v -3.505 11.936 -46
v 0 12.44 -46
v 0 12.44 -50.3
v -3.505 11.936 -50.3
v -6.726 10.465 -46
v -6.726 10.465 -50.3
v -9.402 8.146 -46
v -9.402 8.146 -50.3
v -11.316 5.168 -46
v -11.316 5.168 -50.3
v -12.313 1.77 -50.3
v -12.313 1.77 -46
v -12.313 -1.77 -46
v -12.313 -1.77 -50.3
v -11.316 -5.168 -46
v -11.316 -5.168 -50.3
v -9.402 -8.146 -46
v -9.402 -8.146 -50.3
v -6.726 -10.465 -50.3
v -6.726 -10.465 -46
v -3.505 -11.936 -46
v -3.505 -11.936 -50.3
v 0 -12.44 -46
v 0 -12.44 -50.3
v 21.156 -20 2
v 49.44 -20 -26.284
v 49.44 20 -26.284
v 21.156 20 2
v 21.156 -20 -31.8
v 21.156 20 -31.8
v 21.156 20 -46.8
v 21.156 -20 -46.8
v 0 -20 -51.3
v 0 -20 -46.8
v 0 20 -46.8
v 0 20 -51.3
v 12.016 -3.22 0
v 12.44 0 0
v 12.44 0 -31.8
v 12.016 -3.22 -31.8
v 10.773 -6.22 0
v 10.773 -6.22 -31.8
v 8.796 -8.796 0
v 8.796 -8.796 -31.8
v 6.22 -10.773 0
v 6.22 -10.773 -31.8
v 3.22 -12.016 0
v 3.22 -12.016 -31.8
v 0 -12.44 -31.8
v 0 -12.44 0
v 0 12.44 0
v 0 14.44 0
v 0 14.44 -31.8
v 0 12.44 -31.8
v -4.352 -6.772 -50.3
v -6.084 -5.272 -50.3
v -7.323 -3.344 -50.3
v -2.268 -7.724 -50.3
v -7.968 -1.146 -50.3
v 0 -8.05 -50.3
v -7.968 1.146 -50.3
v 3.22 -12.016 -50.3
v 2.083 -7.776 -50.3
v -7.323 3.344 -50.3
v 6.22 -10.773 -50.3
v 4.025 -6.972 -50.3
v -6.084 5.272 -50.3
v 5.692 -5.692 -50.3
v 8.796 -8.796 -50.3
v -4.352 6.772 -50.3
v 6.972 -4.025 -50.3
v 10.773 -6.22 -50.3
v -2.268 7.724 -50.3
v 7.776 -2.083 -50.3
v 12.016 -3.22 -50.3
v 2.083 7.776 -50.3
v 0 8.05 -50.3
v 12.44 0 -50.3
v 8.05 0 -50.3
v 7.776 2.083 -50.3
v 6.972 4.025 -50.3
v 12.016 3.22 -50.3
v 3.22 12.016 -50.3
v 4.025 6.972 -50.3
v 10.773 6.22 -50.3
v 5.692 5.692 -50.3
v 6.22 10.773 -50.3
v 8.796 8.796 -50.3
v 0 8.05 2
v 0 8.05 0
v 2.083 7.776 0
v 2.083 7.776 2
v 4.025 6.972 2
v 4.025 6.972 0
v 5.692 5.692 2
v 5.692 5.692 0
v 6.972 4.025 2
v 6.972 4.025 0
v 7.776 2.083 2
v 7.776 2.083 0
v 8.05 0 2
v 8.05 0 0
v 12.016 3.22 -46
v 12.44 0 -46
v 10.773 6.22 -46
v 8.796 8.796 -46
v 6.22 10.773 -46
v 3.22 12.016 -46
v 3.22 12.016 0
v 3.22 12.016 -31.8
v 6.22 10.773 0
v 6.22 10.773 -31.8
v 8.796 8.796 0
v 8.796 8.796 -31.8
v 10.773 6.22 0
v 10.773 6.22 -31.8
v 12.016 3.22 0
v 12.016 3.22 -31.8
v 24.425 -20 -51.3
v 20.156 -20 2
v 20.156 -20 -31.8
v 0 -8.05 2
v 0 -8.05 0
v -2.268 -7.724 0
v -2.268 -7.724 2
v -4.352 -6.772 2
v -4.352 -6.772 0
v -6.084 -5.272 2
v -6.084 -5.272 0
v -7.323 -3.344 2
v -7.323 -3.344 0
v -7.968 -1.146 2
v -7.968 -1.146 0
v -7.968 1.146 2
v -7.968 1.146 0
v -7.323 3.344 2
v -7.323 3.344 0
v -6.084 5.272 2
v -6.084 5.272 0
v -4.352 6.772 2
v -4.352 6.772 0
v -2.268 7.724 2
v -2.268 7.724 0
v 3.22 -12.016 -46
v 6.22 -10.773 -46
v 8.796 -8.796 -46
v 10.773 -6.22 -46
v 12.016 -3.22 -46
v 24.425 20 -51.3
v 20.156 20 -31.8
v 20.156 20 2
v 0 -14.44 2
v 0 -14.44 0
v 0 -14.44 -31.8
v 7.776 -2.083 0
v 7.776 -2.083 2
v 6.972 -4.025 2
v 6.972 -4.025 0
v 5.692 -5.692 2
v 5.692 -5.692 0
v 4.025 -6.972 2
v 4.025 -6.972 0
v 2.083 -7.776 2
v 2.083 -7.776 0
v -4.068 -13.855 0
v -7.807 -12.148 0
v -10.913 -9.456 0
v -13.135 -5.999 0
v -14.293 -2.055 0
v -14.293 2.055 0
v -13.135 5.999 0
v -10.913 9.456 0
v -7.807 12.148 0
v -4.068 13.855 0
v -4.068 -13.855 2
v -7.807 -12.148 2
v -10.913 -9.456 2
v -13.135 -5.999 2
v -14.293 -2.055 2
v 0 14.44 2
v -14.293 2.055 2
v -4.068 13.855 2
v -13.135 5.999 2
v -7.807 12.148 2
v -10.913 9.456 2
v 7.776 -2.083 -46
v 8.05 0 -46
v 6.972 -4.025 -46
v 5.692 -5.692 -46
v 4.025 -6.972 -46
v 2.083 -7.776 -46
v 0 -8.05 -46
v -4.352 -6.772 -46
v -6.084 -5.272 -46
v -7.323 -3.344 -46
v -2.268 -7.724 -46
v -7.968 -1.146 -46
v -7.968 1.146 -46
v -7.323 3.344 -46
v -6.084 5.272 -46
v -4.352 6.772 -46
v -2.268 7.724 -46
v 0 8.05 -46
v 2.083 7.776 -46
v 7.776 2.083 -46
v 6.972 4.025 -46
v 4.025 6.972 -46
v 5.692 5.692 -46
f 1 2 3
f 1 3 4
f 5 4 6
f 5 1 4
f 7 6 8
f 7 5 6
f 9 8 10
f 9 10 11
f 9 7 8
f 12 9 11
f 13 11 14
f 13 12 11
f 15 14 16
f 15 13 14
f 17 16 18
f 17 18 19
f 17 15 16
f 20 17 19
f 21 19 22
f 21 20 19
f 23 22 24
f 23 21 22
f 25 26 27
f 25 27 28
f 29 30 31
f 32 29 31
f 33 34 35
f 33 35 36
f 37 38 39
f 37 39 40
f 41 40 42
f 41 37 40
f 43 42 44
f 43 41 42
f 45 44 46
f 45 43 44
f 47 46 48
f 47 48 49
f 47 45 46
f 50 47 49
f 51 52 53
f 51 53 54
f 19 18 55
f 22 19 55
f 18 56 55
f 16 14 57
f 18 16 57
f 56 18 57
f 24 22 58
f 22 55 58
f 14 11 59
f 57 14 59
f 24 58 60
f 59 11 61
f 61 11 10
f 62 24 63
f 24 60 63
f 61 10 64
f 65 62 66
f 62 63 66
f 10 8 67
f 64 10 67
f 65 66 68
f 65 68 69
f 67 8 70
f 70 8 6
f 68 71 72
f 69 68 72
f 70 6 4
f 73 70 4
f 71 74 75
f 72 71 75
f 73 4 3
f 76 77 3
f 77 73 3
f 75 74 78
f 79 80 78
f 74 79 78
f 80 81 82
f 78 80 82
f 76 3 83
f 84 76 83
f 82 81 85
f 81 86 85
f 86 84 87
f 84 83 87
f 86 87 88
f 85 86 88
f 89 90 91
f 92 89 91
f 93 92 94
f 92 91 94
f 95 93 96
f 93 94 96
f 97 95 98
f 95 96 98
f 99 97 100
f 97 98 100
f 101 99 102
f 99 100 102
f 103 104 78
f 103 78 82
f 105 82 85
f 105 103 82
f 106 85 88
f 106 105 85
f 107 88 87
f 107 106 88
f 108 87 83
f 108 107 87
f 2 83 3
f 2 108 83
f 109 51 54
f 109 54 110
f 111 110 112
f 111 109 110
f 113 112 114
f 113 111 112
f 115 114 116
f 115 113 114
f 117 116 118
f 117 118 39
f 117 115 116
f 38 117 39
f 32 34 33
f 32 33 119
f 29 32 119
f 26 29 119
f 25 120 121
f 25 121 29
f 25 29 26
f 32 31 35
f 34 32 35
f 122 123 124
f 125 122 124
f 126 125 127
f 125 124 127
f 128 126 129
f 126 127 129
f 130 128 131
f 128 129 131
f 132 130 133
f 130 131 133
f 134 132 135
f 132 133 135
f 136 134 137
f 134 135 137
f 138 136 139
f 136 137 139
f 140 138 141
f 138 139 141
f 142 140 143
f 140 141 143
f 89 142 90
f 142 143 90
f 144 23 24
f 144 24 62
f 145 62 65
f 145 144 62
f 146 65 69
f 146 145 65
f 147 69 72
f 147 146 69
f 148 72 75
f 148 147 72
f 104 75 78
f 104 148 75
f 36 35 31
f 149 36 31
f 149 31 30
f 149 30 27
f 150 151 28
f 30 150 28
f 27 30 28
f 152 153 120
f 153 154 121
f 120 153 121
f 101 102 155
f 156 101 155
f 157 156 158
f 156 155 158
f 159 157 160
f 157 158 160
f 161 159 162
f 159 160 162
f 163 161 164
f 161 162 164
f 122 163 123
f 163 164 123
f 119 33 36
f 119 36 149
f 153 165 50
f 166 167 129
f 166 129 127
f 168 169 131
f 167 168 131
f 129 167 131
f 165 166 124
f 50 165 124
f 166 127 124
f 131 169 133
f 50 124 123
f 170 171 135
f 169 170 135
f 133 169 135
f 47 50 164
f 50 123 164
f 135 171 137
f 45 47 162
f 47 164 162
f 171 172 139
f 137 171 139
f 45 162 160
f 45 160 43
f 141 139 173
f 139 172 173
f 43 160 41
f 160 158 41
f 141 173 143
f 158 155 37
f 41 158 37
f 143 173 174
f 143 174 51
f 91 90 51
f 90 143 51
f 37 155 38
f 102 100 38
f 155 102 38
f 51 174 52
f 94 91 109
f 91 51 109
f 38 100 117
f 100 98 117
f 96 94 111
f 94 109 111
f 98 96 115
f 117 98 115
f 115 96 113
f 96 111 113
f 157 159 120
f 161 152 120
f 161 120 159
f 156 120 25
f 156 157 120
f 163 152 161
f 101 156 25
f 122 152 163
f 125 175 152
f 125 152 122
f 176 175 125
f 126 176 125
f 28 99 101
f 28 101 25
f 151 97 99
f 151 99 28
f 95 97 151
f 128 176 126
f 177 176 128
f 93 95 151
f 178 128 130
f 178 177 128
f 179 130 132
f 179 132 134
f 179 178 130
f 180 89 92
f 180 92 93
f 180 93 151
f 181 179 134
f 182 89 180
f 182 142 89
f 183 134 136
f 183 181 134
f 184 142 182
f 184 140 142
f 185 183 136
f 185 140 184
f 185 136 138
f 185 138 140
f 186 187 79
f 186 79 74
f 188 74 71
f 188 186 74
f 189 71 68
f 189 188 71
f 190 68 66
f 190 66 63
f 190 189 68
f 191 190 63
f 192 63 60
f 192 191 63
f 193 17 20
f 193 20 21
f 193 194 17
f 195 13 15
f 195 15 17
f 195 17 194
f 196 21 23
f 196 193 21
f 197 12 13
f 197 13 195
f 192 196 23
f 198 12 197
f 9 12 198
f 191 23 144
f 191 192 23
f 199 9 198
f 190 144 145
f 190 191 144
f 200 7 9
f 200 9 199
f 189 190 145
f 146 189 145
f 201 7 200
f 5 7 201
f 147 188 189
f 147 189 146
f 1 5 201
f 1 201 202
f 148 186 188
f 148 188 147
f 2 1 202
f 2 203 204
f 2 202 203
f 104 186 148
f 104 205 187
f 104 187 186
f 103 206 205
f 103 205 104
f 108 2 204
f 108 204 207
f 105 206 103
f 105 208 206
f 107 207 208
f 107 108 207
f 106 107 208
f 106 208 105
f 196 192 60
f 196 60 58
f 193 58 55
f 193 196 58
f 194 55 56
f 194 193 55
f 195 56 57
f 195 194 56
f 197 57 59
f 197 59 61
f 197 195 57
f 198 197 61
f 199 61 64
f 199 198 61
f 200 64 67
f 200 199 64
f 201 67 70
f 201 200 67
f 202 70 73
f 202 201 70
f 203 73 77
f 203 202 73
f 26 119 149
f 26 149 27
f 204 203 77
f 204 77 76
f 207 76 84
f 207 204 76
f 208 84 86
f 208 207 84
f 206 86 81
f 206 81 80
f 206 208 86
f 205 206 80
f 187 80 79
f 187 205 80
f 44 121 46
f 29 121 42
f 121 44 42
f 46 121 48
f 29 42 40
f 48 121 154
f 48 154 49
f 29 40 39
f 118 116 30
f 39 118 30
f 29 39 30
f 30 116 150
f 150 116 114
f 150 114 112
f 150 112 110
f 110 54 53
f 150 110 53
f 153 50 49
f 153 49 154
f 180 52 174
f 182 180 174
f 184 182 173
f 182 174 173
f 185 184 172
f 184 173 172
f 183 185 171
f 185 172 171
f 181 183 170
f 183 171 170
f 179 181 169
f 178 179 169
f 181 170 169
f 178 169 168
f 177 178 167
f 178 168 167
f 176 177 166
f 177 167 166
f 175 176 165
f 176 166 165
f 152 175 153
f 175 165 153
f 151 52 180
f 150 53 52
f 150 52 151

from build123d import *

# Parameters (mm, degrees)
F1_DEPTH = 31.8
F2_DEPTH = 31.8
F3_DEPTH = 2
F4_DEPTH = 1
F6_START = -46
F6_DEPTH = 4.3
F7_DEPTH = 40


with BuildPart() as f1:
    # F0 (on Top) → F1 (new body)
    with BuildSketch(Plane.XY):
        with BuildLine():
            ThreePointArc((0, 12.44), (8.796408358, 8.796408358), (12.44, 0))
            ThreePointArc((12.44, 0), (8.796408358, -8.796408358), (0, -12.44))
            Line((0, -12.44), (0, -14.44))
            ThreePointArc((0, -14.44), (10.2106219203, -10.2106219203), (14.44, 0))
            ThreePointArc((14.44, 0), (10.2106219203, 10.2106219203), (0, 14.44))
            Line((0, 14.44), (0, 12.44))
        make_face()
    extrude(amount=-F1_DEPTH)

    # F0 (on Top) → F2 (join)
    with BuildSketch(Plane.XY):
        with BuildLine():
            add(Edge.make_bspline(
                [(0, 14.44), (6.7187255869, 16.2933333333), (13.4374511739, 18.1466666667), (20.1561767608, 20)],
                knots=[0, 0, 0, 0, 20.9089708406, 20.9089708406, 20.9089708406, 20.9089708406], degree=3))
            ThreePointArc((0, 14.44), (10.2106219203, 10.2106219203), (14.44, 0))
            ThreePointArc((14.44, 0), (10.2106219203, -10.2106219203), (0, -14.44))
            add(Edge.make_bspline(
                [(0, -14.44), (6.7187255869, -16.2933333333), (13.4374511739, -18.1466666667), (20.1561767608, -20)],
                knots=[0, 0, 0, 0, 20.9089708406, 20.9089708406, 20.9089708406, 20.9089708406], degree=3))
            Line((20.1561767608, -20), (20.1561767608, 20))
        make_face()
    extrude(amount=-F2_DEPTH)

    # F0 (on Top) → F3 (join)
    with BuildSketch(Plane.XY):
        with BuildLine():
            ThreePointArc((0, 12.44), (8.796408358, 8.796408358), (12.44, 0))
            ThreePointArc((12.44, 0), (8.796408358, -8.796408358), (0, -12.44))
            Line((0, -12.44), (0, -14.44))
            ThreePointArc((0, -14.44), (10.2106219203, -10.2106219203), (14.44, 0))
            ThreePointArc((14.44, 0), (10.2106219203, 10.2106219203), (0, 14.44))
            Line((0, 14.44), (0, 12.44))
        make_face()
        with BuildLine():
            ThreePointArc((0, -12.44), (8.796408358, -8.796408358), (12.44, 0))
            ThreePointArc((12.44, 0), (8.796408358, 8.796408358), (0, 12.44))
            Line((0, 12.44), (0, 8.05))
            ThreePointArc((0, 8.05), (5.6922095886, 5.6922095886), (8.05, 0))
            ThreePointArc((8.05, 0), (5.6922095886, -5.6922095886), (0, -8.05))
            Line((0, -8.05), (0, -12.44))
        make_face()
        with BuildLine():
            Line((0, 8.05), (0, 12.44))
            ThreePointArc((0, 12.44), (-12.44, 0), (0, -12.44))
            Line((0, -12.44), (0, -8.05))
            ThreePointArc((0, -8.05), (-8.05, 0), (0, 8.05))
        make_face()
        with BuildLine():
            ThreePointArc((0, -12.44), (-12.44, 0), (0, 12.44))
            Line((0, 12.44), (0, 14.44))
            ThreePointArc((0, 14.44), (-14.44, 0), (0, -14.44))
            Line((0, -14.44), (0, -12.44))
        make_face()
        with BuildLine():
            add(Edge.make_bspline(
                [(0, 14.44), (6.7187255869, 16.2933333333), (13.4374511739, 18.1466666667), (20.1561767608, 20)],
                knots=[0, 0, 0, 0, 20.9089708406, 20.9089708406, 20.9089708406, 20.9089708406], degree=3))
            ThreePointArc((0, 14.44), (10.2106219203, 10.2106219203), (14.44, 0))
            ThreePointArc((14.44, 0), (10.2106219203, -10.2106219203), (0, -14.44))
            add(Edge.make_bspline(
                [(0, -14.44), (6.7187255869, -16.2933333333), (13.4374511739, -18.1466666667), (20.1561767608, -20)],
                knots=[0, 0, 0, 0, 20.9089708406, 20.9089708406, 20.9089708406, 20.9089708406], degree=3))
            Line((20.1561767608, -20), (20.1561767608, 20))
        make_face()
    extrude(amount=F3_DEPTH)

    # F4 (add): a face of the model
    f4_faces = [f1.faces().sort_by_distance(p)[0] for p in [
        (20.1561767608, 0, -14.9),
    ]]
    extrude(f4_faces, amount=F4_DEPTH)

    # F5 (on face) → F7 (join, through all)
    with BuildSketch(Plane.XZ.offset(20)):
        Polygon((49.4404480083, -26.2842712475), (21.1561767608, 2), (21.1561767608, -31.8), (21.1561767608, -46.8), (0, -46.8), (0, -51.3), (24.4247192557, -51.3), align=None)
    extrude(amount=-F7_DEPTH)


with BuildPart() as f6:
    # F0 (on Top) → F6 (new body)
    with BuildSketch(Plane.XY.offset(F6_START)):
        with BuildLine():
            ThreePointArc((0, -12.44), (8.796408358, -8.796408358), (12.44, 0))
            ThreePointArc((12.44, 0), (8.796408358, 8.796408358), (0, 12.44))
            Line((0, 12.44), (0, 8.05))
            ThreePointArc((0, 8.05), (5.6922095886, 5.6922095886), (8.05, 0))
            ThreePointArc((8.05, 0), (5.6922095886, -5.6922095886), (0, -8.05))
            Line((0, -8.05), (0, -12.44))
        make_face()
        with BuildLine():
            Line((0, 8.05), (0, 12.44))
            ThreePointArc((0, 12.44), (-12.44, 0), (0, -12.44))
            Line((0, -12.44), (0, -8.05))
            ThreePointArc((0, -8.05), (-8.05, 0), (0, 8.05))
        make_face()
    extrude(amount=-F6_DEPTH)


solid = Compound([f1.part, f6.part])
